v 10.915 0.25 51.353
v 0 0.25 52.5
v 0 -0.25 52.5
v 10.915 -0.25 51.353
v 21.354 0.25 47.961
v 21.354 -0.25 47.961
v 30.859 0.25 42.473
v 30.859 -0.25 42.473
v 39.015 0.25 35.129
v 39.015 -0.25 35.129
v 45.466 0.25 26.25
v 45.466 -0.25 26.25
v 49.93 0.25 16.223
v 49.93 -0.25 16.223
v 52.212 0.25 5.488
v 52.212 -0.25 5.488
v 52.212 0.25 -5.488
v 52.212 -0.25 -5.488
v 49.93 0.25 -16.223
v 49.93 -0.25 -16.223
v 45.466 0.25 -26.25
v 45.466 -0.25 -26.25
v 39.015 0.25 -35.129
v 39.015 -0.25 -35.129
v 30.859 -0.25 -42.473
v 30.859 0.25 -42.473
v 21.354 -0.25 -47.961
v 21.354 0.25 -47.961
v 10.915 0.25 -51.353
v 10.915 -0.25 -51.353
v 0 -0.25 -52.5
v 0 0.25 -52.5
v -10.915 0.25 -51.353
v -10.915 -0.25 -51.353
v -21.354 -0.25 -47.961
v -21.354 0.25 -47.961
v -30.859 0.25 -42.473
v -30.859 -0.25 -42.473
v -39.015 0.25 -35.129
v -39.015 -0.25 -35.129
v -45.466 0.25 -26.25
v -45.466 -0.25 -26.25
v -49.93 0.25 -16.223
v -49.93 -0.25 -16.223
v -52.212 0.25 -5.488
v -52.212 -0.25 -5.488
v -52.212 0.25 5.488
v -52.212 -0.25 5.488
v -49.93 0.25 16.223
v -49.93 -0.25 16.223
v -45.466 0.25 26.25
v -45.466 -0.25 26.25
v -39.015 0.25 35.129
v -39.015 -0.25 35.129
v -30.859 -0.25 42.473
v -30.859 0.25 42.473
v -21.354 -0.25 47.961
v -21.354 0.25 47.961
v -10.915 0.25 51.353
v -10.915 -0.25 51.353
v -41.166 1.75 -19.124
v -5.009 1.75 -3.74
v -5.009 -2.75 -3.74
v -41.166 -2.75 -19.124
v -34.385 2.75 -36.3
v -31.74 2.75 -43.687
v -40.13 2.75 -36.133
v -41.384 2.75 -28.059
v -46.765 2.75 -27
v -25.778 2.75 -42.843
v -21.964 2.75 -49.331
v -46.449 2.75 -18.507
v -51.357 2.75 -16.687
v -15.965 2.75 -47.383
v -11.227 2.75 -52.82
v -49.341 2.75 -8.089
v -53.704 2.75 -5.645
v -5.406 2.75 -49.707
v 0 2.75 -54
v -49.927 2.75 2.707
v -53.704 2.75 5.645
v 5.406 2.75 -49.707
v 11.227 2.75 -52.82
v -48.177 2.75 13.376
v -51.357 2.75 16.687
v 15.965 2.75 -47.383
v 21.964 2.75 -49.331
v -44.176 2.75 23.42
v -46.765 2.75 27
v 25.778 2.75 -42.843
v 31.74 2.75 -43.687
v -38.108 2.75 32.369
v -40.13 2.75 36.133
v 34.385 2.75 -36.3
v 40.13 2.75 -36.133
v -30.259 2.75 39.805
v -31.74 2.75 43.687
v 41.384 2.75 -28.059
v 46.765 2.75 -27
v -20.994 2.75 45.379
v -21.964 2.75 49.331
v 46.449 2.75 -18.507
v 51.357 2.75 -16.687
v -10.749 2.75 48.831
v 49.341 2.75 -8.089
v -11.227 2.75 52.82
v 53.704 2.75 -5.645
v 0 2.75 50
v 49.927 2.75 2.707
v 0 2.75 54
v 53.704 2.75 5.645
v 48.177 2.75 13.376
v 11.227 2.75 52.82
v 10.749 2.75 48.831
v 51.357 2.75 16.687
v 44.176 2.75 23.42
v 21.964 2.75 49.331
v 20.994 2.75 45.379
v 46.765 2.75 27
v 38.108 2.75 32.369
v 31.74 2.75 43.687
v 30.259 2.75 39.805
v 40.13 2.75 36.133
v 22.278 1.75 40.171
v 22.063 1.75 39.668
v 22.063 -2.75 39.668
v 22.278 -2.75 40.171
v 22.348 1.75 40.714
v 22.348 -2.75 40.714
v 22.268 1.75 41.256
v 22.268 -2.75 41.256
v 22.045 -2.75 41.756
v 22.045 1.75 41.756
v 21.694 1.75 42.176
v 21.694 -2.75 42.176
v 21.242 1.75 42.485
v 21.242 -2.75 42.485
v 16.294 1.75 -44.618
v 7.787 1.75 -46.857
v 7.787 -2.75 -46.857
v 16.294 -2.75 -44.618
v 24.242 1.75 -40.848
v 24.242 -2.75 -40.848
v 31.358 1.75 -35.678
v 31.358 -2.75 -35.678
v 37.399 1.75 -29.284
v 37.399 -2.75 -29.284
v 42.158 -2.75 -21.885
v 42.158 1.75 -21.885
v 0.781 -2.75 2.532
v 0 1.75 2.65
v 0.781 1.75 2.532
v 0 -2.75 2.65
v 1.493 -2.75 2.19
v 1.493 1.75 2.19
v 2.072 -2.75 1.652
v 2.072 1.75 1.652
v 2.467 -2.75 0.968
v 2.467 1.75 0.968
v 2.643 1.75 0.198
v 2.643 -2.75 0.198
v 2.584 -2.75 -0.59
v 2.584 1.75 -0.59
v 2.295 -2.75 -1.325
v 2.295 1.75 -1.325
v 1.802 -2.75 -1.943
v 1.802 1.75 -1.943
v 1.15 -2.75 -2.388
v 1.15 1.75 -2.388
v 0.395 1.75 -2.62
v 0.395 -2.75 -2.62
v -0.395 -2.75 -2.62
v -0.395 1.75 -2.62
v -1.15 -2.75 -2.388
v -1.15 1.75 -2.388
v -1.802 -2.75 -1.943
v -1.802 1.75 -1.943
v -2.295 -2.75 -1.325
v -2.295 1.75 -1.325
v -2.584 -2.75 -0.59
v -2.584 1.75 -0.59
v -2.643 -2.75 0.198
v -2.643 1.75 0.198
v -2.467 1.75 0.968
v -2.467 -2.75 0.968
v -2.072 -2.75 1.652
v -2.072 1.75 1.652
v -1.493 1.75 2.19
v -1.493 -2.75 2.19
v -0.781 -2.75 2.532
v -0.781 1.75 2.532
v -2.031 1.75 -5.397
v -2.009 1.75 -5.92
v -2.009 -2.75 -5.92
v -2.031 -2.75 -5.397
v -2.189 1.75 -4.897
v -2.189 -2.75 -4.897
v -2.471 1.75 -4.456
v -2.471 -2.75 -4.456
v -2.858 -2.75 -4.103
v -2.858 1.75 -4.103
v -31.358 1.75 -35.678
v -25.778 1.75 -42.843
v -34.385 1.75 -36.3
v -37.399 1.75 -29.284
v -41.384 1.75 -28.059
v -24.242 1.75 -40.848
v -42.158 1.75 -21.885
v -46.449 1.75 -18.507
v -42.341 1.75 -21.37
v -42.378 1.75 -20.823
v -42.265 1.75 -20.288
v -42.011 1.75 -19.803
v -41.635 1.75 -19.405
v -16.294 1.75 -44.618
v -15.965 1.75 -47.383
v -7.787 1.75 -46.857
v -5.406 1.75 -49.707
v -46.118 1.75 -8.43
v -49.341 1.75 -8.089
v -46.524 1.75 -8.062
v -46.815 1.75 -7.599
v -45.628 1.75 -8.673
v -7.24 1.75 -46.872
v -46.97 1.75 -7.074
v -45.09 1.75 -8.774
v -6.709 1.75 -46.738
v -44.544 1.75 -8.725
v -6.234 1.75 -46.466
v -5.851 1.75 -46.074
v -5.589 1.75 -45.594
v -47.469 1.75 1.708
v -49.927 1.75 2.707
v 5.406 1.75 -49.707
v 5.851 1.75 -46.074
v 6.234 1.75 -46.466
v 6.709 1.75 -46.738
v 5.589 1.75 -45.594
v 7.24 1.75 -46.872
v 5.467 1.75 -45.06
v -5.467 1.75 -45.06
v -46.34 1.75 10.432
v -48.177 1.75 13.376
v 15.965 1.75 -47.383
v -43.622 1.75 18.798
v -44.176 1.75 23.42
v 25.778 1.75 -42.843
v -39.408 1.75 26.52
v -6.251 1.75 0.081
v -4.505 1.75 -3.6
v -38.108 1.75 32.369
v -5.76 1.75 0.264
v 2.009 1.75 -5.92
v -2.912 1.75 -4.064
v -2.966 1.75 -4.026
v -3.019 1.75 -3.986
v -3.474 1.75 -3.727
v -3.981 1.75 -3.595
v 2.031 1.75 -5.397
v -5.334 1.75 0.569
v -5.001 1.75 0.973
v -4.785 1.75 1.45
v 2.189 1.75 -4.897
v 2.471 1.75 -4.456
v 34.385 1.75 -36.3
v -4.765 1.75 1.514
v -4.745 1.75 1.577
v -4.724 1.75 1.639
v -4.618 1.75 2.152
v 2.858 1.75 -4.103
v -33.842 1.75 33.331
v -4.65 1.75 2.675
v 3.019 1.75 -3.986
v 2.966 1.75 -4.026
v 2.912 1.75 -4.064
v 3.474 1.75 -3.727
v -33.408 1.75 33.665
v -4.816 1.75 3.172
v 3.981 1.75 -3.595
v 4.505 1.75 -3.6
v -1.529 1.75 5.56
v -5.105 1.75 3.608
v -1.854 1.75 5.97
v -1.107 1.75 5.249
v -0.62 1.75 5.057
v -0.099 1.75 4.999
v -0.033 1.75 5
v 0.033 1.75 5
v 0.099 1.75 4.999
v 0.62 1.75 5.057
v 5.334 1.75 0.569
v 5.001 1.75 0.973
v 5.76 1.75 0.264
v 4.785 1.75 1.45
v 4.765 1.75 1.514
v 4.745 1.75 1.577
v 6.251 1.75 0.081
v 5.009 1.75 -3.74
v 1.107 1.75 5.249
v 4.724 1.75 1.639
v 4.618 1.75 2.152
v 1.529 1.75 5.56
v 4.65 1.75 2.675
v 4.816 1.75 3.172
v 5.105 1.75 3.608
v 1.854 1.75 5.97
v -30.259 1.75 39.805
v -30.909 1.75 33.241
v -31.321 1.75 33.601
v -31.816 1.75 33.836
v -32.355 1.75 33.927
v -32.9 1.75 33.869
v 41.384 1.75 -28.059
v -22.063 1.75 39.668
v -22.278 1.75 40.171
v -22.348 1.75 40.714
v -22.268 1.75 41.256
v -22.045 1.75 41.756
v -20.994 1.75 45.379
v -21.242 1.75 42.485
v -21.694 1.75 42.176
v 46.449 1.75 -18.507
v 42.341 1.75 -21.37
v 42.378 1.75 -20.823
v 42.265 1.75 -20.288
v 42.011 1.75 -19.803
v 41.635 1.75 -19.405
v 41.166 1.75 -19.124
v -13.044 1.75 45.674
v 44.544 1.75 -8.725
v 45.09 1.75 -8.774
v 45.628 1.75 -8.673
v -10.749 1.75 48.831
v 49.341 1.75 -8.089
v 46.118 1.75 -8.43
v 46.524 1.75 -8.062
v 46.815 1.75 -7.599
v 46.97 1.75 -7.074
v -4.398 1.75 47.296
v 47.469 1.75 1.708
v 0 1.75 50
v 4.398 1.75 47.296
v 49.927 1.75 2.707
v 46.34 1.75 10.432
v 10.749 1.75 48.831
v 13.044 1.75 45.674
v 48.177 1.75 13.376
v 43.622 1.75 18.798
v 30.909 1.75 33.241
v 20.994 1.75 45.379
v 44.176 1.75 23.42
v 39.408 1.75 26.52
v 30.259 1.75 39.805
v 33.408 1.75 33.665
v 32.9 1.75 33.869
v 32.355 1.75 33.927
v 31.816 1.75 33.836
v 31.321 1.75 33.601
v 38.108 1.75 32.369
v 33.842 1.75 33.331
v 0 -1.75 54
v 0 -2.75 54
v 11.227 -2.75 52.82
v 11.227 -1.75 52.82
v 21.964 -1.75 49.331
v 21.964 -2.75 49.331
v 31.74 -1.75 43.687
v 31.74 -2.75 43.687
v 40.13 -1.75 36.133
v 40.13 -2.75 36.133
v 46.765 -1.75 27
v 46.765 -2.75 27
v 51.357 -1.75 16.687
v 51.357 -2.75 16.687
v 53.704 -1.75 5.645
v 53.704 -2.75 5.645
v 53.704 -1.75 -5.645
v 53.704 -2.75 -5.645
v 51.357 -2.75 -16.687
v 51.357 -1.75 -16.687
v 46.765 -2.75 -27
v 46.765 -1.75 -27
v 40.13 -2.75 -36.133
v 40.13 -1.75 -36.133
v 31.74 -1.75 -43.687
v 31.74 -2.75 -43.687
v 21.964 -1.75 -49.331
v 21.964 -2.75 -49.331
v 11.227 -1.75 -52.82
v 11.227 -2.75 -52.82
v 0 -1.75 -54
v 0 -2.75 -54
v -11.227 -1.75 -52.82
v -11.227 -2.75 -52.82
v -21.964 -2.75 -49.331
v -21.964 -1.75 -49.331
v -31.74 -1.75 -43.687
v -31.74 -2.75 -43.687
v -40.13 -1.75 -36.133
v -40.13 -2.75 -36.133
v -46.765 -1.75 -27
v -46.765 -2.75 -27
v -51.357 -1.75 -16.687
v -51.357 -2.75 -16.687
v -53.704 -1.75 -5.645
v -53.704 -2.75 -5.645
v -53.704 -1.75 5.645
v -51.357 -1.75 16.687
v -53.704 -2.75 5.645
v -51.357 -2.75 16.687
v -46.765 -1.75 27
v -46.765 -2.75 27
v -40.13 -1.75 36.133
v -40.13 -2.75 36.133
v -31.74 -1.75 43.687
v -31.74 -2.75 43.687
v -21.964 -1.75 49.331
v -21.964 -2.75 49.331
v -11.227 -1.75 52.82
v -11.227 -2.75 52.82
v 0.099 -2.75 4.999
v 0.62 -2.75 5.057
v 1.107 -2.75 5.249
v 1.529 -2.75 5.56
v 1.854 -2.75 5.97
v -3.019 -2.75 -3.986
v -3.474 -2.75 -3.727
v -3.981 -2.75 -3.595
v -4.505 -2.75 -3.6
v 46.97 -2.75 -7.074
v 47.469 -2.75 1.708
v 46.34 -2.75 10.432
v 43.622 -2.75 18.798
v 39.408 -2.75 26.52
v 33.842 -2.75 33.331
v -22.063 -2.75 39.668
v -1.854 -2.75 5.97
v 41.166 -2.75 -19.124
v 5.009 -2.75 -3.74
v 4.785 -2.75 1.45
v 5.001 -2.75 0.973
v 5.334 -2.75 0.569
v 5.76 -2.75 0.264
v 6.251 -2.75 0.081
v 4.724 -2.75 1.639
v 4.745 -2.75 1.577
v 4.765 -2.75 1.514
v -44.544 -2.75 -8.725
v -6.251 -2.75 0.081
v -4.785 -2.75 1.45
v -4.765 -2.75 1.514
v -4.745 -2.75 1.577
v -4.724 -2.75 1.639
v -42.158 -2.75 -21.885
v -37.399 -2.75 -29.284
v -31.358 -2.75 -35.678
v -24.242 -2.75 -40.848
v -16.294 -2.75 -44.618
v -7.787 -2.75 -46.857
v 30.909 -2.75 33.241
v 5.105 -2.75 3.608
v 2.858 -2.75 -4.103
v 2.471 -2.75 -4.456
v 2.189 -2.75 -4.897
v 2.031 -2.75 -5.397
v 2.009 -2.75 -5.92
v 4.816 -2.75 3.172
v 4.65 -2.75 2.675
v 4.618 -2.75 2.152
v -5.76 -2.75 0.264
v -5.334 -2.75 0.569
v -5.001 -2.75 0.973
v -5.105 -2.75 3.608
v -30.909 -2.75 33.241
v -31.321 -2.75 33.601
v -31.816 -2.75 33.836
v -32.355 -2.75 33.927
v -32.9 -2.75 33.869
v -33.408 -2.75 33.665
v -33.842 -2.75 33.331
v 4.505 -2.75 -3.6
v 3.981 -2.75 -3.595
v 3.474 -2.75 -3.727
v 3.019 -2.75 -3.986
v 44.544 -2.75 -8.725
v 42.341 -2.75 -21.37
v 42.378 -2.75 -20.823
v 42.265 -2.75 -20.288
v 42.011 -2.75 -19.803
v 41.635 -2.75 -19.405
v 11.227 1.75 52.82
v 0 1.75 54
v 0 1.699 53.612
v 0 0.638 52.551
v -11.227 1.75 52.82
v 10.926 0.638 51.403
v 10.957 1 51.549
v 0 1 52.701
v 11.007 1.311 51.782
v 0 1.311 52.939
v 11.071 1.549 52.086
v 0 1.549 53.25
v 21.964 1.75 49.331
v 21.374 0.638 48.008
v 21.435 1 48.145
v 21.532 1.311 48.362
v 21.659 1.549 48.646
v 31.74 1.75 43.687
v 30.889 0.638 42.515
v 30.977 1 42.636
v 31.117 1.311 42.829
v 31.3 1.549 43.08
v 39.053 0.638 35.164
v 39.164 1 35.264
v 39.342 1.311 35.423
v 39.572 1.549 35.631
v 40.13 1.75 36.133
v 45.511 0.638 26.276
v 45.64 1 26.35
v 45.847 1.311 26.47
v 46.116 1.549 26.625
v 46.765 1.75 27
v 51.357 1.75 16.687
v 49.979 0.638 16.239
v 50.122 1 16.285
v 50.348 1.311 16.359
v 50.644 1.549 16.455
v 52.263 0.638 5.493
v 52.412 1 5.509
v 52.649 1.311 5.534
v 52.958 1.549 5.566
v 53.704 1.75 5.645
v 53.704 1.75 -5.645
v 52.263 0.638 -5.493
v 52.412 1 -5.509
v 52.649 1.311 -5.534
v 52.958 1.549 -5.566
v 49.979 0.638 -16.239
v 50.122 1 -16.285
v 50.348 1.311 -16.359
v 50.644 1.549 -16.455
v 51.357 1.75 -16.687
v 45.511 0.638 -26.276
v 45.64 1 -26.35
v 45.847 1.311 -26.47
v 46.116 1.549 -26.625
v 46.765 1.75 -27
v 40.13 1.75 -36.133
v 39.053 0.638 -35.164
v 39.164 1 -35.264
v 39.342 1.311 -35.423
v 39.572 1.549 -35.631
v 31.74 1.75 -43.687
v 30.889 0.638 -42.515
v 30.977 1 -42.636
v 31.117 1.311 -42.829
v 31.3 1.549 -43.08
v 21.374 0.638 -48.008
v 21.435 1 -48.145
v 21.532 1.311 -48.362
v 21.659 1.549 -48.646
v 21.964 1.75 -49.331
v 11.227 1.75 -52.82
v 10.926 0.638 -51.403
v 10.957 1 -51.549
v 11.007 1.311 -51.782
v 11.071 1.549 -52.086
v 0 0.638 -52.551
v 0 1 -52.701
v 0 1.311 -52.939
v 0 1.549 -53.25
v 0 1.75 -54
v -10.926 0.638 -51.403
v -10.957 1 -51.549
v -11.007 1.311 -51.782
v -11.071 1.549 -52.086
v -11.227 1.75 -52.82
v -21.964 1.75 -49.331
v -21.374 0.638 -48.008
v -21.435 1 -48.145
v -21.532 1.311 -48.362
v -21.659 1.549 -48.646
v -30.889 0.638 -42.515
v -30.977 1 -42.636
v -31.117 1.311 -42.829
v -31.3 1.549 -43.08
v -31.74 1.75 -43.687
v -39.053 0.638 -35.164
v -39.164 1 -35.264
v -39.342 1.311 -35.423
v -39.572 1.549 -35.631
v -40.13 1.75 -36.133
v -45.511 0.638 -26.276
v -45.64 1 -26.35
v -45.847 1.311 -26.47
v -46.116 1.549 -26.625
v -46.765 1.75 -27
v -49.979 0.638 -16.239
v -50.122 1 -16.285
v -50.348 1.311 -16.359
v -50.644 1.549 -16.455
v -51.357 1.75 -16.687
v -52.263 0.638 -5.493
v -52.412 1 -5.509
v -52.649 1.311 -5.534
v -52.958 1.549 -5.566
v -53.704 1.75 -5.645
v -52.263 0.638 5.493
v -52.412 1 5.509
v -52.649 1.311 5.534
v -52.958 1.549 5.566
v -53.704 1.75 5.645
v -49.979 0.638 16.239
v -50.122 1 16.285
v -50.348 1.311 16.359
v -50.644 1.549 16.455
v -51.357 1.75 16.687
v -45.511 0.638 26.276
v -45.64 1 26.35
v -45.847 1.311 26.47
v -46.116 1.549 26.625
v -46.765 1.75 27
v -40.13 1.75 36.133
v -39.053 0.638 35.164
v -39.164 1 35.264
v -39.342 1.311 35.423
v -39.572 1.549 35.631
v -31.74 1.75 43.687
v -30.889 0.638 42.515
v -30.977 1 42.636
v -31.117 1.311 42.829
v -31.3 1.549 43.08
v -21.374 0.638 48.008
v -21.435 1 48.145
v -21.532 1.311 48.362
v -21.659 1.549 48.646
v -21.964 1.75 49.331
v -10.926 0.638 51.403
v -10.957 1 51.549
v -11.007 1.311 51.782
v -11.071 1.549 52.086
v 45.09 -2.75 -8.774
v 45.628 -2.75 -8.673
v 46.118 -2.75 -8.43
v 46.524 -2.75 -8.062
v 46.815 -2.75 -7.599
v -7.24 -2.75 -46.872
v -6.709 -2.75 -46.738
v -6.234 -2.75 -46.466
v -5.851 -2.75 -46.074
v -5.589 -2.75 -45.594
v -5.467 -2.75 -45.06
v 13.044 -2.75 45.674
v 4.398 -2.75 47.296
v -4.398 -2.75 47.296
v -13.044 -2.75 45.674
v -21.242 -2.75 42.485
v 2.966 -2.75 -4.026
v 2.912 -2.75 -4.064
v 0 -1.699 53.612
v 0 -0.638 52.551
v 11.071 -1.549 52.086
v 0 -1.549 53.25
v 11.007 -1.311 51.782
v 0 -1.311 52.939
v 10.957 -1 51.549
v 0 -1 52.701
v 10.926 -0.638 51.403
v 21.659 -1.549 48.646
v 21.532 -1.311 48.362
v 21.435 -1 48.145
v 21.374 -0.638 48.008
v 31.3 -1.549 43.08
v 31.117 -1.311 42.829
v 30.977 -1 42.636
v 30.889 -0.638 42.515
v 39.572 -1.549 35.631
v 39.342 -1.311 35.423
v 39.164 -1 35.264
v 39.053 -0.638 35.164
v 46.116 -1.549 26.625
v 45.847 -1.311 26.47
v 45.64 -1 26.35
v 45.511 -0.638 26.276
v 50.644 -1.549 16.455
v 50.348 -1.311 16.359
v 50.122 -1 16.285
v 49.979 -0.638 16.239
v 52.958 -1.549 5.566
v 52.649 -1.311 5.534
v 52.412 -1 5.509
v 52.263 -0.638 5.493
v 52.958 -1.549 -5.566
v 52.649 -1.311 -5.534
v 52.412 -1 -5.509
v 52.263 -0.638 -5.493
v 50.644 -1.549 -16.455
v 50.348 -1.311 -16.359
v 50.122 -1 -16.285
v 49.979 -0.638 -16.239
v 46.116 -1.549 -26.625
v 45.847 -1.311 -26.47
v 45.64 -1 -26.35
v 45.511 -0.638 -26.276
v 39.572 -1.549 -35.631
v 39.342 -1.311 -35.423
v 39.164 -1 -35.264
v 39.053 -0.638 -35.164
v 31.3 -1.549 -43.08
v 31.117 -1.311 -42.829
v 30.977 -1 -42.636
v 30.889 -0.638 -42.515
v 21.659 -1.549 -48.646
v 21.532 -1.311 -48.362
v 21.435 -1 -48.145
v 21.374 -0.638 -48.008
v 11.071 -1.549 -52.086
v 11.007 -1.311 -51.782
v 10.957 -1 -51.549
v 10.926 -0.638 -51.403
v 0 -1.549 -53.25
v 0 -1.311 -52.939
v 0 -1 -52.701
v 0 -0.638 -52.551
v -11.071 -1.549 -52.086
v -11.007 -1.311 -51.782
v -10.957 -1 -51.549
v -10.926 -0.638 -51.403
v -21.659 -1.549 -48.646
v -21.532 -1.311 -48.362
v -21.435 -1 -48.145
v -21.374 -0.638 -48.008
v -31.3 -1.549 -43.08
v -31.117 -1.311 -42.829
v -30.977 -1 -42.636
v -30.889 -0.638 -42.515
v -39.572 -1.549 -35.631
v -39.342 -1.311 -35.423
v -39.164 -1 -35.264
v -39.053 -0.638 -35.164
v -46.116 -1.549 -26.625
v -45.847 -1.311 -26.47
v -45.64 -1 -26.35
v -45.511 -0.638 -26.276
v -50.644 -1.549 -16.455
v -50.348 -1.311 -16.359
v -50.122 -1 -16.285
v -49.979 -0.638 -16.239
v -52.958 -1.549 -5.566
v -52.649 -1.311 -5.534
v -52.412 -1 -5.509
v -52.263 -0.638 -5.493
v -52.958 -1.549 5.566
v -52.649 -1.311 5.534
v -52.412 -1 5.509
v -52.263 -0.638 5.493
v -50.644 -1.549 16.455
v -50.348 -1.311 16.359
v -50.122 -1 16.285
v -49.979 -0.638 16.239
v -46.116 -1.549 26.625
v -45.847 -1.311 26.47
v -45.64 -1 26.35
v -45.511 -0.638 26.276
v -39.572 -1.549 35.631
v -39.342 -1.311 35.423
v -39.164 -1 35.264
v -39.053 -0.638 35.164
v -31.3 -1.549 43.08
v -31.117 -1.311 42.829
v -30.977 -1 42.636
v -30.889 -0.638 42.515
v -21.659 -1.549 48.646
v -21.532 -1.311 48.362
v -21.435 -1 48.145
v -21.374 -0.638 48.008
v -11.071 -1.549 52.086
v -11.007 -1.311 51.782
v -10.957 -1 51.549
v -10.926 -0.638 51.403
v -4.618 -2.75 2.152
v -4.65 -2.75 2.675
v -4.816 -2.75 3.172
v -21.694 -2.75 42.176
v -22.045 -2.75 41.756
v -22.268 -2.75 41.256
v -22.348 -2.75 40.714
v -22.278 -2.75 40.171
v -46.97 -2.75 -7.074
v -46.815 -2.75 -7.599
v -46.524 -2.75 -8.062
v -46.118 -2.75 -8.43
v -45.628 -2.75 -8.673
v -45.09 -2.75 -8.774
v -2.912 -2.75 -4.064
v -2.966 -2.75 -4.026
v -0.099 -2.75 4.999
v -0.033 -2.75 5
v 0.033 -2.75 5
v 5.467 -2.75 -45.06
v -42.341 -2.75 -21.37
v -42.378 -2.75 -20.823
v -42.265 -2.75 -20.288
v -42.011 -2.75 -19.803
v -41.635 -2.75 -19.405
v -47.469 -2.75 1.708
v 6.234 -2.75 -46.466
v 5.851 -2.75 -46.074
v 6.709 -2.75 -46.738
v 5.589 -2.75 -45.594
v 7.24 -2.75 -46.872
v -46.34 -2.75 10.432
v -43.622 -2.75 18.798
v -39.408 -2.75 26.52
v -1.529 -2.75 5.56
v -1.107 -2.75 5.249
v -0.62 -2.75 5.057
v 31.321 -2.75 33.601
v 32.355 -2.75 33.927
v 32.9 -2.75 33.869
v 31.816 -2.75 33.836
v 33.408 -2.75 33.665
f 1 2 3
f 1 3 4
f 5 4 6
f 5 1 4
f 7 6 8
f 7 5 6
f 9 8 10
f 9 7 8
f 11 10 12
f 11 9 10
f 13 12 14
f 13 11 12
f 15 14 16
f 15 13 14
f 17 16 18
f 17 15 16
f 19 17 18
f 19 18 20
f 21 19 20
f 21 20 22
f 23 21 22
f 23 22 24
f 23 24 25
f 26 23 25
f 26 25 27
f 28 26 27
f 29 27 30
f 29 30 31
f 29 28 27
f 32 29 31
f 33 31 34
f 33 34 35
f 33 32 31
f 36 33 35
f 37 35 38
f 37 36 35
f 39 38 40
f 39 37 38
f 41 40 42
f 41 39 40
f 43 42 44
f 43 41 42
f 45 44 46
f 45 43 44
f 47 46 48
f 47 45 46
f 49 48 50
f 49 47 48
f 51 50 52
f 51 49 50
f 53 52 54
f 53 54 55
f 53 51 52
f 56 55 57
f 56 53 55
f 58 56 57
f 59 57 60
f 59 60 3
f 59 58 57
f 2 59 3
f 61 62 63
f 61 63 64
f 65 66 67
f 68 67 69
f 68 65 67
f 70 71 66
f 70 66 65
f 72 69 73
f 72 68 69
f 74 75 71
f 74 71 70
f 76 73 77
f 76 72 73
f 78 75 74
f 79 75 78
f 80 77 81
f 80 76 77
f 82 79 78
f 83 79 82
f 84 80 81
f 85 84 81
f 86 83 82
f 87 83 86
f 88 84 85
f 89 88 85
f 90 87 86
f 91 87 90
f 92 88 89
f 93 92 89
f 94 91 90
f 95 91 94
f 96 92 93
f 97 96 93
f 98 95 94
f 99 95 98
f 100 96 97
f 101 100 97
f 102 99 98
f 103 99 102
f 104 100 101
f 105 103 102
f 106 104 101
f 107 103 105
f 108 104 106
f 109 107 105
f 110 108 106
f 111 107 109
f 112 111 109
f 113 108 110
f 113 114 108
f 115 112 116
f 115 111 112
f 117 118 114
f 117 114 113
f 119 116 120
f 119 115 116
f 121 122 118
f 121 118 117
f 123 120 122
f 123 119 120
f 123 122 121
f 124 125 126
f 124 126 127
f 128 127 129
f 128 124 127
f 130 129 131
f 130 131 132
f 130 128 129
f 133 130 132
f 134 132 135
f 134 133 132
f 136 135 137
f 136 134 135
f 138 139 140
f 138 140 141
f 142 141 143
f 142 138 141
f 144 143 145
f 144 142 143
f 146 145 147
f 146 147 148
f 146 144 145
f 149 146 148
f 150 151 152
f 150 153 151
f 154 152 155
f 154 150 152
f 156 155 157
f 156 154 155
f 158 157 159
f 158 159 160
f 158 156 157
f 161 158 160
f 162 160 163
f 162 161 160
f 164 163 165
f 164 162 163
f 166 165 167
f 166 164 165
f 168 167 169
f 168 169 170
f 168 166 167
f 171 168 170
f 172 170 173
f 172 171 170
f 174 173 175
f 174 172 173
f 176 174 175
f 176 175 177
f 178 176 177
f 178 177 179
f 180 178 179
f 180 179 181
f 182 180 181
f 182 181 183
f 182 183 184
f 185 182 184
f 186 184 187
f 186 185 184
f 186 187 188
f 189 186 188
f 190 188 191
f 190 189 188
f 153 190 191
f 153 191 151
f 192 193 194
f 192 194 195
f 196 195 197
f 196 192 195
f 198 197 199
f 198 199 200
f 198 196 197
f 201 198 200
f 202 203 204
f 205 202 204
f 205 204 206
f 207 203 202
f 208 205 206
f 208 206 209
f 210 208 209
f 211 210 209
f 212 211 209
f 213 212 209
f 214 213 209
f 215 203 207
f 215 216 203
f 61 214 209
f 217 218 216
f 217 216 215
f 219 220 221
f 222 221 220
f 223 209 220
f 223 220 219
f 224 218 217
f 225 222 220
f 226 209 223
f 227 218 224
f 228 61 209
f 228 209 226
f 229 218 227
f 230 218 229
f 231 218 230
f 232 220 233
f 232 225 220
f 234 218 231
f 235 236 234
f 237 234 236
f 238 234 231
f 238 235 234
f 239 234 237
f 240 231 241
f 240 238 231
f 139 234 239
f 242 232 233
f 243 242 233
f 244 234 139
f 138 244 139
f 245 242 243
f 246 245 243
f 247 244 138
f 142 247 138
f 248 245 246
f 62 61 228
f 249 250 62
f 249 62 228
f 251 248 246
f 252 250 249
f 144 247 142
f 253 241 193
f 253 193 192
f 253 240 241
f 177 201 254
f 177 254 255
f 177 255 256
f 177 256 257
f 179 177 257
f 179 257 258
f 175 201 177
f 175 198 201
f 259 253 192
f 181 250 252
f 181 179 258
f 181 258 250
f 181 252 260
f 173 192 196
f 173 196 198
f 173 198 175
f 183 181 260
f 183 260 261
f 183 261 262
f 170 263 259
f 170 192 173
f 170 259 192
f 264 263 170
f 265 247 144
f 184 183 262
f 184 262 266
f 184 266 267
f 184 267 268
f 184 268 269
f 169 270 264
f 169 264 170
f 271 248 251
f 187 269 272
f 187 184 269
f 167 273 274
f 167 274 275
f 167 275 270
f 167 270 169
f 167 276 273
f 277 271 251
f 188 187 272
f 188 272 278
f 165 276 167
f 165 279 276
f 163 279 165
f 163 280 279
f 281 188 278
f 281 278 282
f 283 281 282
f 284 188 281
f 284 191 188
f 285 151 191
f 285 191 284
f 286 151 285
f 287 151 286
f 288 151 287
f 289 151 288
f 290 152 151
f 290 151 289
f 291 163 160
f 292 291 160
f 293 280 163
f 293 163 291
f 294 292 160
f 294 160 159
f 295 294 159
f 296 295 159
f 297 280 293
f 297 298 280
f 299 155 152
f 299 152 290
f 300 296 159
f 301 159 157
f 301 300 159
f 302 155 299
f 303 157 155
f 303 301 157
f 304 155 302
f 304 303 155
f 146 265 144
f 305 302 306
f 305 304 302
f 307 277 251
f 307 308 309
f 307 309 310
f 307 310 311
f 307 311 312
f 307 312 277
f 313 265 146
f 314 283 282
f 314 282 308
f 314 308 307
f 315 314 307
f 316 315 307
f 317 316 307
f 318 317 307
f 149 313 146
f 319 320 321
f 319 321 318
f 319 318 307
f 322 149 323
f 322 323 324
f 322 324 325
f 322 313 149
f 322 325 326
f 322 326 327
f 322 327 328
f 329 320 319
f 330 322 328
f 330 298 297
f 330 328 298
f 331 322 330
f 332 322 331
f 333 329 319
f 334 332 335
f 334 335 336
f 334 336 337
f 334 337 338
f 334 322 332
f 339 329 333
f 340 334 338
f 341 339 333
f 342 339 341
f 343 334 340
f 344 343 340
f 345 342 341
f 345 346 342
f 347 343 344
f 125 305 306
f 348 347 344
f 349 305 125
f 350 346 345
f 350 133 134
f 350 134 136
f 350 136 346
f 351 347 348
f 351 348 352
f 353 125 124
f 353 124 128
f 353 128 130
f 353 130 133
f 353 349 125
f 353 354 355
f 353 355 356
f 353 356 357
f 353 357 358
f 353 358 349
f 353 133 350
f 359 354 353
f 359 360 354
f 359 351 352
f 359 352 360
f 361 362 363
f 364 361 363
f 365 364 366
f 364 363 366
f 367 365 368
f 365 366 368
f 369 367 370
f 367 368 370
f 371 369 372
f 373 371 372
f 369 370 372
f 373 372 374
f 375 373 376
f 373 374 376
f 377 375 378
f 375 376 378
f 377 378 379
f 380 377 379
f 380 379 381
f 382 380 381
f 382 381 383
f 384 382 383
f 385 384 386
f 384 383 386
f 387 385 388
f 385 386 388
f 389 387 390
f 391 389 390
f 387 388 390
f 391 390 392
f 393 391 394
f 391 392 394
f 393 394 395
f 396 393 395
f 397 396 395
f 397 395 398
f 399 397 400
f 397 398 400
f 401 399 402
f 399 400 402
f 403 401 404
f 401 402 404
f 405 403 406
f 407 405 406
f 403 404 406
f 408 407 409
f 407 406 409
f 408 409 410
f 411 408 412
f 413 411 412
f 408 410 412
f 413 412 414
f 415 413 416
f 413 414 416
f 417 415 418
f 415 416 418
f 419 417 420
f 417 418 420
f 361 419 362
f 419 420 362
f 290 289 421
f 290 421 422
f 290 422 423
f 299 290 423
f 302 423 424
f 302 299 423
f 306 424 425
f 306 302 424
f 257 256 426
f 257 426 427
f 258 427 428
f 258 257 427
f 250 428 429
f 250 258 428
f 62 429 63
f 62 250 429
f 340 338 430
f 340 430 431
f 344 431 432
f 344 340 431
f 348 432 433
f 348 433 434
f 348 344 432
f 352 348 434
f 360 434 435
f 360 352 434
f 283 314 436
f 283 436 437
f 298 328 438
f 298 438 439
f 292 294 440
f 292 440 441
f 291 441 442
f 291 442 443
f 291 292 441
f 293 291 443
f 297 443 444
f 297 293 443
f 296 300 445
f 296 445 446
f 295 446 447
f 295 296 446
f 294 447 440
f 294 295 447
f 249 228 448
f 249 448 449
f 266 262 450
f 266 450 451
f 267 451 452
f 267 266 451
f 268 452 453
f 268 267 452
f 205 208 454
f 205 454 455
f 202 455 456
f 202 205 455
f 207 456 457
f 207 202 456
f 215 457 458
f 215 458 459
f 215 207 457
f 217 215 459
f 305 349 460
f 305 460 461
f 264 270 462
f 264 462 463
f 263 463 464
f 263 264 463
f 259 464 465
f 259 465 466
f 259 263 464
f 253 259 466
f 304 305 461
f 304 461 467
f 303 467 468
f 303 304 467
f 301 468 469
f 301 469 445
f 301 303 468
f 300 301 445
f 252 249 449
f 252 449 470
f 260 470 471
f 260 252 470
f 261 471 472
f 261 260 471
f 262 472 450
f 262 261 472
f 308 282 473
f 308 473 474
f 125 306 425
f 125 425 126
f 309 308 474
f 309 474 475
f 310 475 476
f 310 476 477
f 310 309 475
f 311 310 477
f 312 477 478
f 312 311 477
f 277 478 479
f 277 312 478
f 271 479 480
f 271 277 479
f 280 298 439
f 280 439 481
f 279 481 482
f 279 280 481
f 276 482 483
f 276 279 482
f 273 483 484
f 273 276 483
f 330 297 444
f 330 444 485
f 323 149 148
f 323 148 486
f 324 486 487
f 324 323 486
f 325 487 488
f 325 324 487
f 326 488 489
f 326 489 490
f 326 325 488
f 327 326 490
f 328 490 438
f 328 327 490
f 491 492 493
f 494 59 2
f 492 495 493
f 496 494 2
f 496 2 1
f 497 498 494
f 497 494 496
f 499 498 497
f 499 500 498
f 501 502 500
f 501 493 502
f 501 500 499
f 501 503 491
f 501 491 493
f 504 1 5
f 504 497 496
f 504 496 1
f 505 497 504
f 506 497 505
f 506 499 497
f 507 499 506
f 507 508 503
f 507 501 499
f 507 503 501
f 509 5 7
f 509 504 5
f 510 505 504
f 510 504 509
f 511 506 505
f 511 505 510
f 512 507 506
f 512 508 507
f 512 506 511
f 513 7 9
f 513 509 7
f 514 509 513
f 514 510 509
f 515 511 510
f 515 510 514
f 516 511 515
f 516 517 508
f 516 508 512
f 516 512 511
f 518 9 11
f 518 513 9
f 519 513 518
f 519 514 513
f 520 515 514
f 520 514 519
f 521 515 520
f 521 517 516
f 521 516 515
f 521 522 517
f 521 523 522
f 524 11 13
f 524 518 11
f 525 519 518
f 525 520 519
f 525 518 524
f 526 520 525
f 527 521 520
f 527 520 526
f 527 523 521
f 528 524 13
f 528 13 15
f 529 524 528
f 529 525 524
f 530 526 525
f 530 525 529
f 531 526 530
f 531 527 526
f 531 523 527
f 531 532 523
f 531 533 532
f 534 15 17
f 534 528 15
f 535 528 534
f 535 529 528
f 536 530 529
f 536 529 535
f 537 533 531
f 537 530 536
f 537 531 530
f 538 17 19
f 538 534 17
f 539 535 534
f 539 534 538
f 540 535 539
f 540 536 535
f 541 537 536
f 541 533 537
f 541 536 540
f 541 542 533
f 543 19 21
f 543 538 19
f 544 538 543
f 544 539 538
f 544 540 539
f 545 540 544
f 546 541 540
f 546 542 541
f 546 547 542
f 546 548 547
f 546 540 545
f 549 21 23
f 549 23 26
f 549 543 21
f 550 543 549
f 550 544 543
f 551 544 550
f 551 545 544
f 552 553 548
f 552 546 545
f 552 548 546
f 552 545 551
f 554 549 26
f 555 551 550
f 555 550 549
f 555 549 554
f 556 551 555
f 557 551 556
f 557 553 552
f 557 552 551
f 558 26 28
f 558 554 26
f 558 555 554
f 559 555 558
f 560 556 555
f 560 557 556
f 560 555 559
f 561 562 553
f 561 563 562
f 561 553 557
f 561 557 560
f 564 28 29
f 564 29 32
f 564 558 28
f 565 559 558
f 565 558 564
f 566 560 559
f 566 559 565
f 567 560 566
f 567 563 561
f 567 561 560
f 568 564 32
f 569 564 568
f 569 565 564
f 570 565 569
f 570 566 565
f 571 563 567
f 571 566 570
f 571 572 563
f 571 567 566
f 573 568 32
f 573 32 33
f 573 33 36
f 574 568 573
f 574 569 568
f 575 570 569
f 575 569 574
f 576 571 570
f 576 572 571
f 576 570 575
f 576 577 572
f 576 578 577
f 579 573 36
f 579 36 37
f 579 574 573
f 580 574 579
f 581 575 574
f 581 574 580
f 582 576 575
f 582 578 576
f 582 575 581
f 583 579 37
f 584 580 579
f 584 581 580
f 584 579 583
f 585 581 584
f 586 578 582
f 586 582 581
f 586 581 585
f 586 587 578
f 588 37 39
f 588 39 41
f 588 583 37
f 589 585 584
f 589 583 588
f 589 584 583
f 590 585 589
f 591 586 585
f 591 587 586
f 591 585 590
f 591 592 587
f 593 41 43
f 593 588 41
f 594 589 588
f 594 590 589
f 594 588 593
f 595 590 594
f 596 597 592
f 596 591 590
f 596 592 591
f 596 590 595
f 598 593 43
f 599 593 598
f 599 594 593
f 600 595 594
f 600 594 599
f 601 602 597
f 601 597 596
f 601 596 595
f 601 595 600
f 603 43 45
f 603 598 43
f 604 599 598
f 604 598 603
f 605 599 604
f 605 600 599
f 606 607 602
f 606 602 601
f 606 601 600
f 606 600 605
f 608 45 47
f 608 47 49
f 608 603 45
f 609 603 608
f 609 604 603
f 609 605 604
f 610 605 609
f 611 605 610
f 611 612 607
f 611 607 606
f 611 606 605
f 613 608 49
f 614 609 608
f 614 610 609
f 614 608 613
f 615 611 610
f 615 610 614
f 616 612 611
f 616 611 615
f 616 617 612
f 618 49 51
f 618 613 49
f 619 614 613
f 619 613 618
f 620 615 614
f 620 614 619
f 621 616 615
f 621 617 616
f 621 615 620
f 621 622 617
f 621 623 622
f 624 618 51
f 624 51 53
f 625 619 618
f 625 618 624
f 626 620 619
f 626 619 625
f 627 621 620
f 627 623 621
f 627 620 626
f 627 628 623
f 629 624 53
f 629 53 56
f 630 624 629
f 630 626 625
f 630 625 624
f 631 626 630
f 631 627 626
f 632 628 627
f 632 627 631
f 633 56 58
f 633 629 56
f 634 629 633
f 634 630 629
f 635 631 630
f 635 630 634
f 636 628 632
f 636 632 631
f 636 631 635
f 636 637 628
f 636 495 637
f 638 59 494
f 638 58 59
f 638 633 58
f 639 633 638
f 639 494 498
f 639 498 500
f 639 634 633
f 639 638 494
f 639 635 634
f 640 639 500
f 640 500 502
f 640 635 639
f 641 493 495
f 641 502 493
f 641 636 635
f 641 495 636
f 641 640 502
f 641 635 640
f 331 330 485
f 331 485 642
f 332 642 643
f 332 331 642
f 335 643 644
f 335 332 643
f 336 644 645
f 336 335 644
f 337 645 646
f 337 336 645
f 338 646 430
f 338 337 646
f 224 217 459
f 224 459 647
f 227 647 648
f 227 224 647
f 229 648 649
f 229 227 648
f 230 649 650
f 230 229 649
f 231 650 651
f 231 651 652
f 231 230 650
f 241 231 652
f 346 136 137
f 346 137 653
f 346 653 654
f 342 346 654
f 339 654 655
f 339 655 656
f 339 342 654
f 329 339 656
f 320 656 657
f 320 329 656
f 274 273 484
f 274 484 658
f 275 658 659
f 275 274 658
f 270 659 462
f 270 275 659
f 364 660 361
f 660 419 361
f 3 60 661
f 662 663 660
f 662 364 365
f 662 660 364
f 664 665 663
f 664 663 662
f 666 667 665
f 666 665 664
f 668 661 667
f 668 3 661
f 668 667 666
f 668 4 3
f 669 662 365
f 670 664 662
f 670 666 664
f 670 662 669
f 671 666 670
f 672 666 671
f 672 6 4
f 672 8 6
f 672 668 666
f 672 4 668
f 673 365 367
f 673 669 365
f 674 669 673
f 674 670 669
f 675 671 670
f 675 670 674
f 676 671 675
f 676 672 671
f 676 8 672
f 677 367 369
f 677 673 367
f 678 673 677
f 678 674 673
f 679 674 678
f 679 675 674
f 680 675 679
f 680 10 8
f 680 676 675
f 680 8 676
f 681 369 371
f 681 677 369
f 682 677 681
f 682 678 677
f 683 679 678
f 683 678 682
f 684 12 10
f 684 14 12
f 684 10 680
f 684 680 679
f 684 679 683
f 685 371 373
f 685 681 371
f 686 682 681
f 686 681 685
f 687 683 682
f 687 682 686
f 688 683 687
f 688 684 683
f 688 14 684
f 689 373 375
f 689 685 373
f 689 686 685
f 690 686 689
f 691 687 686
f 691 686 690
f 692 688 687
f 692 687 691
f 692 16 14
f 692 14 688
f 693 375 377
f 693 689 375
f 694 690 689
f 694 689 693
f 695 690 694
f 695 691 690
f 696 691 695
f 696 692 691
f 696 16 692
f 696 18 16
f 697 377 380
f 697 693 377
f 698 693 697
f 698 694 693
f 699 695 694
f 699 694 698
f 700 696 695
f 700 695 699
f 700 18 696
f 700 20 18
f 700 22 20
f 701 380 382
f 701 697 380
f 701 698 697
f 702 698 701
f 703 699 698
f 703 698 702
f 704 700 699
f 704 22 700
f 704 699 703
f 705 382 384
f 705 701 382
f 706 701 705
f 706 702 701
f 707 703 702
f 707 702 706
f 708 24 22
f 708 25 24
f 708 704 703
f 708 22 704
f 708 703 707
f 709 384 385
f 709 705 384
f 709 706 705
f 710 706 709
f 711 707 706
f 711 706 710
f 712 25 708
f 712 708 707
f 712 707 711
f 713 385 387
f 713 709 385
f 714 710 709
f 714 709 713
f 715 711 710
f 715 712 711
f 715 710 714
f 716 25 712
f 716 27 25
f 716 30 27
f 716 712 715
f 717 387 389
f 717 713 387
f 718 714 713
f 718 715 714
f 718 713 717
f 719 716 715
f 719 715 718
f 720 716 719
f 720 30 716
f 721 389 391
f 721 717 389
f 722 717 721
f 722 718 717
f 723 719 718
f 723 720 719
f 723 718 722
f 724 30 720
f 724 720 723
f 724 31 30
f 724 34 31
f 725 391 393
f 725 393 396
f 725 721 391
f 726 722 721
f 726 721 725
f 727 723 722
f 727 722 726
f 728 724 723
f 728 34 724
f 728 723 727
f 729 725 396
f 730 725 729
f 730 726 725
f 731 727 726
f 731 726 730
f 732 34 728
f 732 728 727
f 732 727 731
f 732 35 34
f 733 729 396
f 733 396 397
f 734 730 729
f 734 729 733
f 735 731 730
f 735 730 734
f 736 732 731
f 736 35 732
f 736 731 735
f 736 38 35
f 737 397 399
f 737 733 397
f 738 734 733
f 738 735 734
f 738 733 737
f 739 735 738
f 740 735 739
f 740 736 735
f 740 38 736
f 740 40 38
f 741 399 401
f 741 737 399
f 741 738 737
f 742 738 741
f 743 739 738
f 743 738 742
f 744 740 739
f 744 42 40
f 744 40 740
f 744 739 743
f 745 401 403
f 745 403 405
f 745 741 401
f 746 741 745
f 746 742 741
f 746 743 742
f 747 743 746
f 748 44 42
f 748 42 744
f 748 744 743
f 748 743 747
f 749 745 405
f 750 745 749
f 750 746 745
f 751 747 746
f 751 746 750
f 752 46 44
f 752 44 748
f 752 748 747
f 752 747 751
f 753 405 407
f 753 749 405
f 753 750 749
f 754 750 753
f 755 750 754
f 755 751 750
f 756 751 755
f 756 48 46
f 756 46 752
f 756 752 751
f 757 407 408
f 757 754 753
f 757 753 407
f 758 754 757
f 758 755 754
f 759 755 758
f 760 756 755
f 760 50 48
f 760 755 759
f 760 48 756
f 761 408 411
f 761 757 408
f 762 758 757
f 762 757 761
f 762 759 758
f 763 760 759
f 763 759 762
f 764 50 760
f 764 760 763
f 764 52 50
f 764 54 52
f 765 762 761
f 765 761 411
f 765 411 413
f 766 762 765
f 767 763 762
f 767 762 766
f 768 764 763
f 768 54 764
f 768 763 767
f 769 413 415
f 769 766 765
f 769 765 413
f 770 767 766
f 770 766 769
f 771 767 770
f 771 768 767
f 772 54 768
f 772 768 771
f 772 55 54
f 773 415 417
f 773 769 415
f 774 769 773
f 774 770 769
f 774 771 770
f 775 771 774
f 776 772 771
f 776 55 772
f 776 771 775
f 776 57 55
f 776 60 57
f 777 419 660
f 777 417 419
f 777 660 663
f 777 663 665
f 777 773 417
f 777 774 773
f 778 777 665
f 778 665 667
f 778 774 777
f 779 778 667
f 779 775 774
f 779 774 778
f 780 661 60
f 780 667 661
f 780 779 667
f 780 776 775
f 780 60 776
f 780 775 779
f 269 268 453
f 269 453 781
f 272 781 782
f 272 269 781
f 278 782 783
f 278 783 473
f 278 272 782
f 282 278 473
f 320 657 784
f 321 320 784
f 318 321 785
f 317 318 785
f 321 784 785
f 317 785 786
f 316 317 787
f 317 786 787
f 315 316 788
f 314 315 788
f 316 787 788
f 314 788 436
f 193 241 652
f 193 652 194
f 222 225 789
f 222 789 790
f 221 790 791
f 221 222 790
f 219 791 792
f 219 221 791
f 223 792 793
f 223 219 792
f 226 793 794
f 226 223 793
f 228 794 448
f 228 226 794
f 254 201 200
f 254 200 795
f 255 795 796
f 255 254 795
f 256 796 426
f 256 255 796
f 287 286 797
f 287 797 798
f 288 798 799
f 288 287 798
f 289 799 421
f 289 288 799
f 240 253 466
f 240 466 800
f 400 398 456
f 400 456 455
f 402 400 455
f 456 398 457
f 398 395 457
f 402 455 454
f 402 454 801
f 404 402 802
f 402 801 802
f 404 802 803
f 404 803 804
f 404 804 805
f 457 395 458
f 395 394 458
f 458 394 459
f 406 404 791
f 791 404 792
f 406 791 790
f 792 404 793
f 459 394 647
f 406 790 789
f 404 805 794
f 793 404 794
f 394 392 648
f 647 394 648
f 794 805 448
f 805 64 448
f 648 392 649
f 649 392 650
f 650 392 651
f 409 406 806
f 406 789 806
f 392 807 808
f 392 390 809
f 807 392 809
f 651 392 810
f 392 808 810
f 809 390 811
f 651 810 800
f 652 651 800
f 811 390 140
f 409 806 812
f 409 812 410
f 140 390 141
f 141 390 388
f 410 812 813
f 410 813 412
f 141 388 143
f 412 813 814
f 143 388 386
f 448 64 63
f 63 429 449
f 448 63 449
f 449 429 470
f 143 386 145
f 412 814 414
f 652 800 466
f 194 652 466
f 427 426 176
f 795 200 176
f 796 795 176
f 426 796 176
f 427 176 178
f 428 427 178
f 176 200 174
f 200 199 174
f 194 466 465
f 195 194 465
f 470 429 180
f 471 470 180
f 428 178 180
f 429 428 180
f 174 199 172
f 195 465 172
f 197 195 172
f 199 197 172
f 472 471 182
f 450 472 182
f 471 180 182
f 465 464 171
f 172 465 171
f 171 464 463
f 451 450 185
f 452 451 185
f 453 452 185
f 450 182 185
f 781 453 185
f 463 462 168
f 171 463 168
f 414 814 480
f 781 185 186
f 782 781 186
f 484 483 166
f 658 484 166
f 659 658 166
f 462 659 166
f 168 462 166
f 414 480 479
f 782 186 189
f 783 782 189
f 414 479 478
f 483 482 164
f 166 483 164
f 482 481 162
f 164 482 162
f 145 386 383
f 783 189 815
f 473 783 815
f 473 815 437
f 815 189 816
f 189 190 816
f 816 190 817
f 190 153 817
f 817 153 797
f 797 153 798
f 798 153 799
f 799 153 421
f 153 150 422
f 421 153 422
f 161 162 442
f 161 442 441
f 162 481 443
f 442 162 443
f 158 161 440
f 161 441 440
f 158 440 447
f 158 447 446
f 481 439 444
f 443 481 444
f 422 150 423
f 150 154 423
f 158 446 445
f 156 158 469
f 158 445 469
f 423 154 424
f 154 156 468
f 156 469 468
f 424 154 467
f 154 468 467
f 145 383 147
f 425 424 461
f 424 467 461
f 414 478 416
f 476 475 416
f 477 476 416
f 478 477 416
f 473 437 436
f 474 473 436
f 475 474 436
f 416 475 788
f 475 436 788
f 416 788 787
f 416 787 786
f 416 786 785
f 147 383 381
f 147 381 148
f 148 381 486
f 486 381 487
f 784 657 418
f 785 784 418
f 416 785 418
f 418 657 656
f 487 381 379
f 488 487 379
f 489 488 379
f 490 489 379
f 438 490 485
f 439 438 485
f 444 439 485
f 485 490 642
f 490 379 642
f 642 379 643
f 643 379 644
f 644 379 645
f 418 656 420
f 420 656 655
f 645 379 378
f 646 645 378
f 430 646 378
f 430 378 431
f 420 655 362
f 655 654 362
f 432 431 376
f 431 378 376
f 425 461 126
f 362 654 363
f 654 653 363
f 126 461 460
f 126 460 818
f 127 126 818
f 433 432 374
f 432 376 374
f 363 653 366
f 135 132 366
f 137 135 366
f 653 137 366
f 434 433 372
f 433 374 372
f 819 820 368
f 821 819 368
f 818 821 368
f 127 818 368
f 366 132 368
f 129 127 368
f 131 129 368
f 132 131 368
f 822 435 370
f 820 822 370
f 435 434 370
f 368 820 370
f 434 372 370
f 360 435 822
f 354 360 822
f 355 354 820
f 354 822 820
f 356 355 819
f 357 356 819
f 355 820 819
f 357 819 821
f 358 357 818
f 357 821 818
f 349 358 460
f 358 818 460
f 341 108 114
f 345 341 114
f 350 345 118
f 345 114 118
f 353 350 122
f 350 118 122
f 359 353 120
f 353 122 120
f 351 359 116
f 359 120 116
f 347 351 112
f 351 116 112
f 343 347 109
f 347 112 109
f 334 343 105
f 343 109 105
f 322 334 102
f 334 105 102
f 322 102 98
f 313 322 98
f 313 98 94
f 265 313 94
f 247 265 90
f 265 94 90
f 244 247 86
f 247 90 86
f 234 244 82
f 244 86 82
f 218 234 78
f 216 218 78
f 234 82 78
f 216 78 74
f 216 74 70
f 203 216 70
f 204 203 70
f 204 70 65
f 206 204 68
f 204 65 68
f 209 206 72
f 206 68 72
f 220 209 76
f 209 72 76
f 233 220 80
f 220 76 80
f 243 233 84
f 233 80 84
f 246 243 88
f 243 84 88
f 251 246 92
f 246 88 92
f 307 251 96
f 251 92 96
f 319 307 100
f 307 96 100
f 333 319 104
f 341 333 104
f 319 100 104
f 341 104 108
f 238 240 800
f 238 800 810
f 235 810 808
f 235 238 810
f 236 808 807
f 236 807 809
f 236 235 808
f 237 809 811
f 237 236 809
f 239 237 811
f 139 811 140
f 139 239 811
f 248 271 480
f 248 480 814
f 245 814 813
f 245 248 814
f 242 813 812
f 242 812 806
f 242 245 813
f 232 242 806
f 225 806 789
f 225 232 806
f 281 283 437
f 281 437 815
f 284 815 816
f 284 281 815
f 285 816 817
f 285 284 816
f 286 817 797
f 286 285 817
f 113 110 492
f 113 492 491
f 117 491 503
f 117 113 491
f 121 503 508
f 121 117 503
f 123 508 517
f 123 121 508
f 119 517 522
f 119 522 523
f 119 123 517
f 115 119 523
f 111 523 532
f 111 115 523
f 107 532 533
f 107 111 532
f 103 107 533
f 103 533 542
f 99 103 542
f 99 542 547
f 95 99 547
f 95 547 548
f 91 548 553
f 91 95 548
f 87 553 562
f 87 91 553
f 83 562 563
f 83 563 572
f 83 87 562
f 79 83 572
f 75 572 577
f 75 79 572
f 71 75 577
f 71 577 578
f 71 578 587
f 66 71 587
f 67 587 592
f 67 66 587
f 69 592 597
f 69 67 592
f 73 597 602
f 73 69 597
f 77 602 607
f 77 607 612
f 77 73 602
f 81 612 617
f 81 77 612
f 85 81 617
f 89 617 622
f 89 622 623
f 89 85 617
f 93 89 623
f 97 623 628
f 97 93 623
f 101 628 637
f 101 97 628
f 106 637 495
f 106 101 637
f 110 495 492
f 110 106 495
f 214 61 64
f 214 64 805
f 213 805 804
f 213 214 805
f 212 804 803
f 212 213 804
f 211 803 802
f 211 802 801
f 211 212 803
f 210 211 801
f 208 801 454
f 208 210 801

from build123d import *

# Parameters (mm, degrees)
SKETCH_2_R          = 52.5
SKETCH_2_R_2        = 2.65
EXTRUDE_1_DEPTH     = 2.75
SKETCH_3_R          = 54
SKETCH_3_R_2        = 52.5
EXTRUDE_2_DEPTH     = 1
SKETCH_4_R          = 50
SKETCH_4_R_2        = 2.65
CUT_EXTRUDE_1_DEPTH = 1
FILLET_1_R          = 1.5


with BuildPart() as part:
    # 草图2 → 凸台-拉伸1 (new, symmetric)
    with BuildSketch(Plane(origin=(0, 0, 0), x_dir=(1, 0, 0), z_dir=(0, 1, 0))):
        with Locations(Location((0, 0, 0), (0, 0, 270))):
            Circle(SKETCH_2_R)
        with Locations(Location((0, 0, 0), (0, 0, 270))):
            Circle(SKETCH_2_R_2, mode=Mode.SUBTRACT)
        with BuildLine():
            Line((-5.104760308, -3.608479293), (-30.908533356, -33.241423952))
            ThreePointArc((-30.908533356, -33.241423952), (-32.355479798, -33.927082172), (-33.841752753, -33.331453173))
            ThreePointArc((-33.841752753, -33.331453173), (-45.175184524, -14.678307233), (-46.970289709, 7.074028884))
            ThreePointArc((-46.970289709, 7.074028884), (-46.117971572, 8.42951219), (-44.544347521, 8.725296818))
            Line((-44.544347521, 8.725296818), (-6.250848753, -0.081181754))
            ThreePointArc((-6.250848753, -0.081181754), (-5.333939805, -0.568676849), (-4.785067523, -1.450216811))
            ThreePointArc((-4.785067523, -1.450216811), (-4.755282581, -1.545084972), (-4.723617, -1.639342075))
            ThreePointArc((-4.723617, -1.639342075), (-4.649507815, -2.675141919), (-5.104760308, -3.608479293))
        make_face(mode=Mode.SUBTRACT)
        with BuildLine():
            Line((-5.009325433, 3.73983413), (-41.165734939, 19.123597139))
            ThreePointArc((-41.165734939, 19.123597139), (-42.264965697, 20.287844939), (-42.157772458, 21.885434001))
            ThreePointArc((-42.157772458, 21.885434001), (-27.919799484, 38.428307233), (-7.786816484, 46.857395244))
            ThreePointArc((-7.786816484, 46.857395244), (-6.234294464, 46.465659903), (-5.466709992, 45.060456971))
            Line((-5.466709992, 45.060456971), (-2.00882693, 5.919823897))
            ThreePointArc((-2.00882693, 5.919823897), (-2.18912187, 4.897147398), (-2.857905332, 4.102728009))
            ThreePointArc((-2.857905332, 4.102728009), (-2.938926261, 4.045084972), (-3.018784891, 3.985842167))
            ThreePointArc((-3.018784891, 3.985842167), (-3.980988084, 3.595280389), (-5.009325433, 3.73983413))
        make_face(mode=Mode.SUBTRACT)
        with BuildLine():
            Line((1.854410058, -5.96999698), (22.063210783, -39.667926976))
            ThreePointArc((22.063210783, -39.667926976), (22.26817946, -41.255934861), (21.242419017, -42.485404956))
            ThreePointArc((21.242419017, -42.485404956), (0, -47.5), (-21.242419017, -42.485404956))
            ThreePointArc((-21.242419017, -42.485404956), (-22.26817946, -41.255934861), (-22.063210783, -39.667926976))
            Line((-22.063210783, -39.667926976), (-1.854410058, -5.96999698))
            ThreePointArc((-1.854410058, -5.96999698), (-1.107434224, -5.24860902), (-0.099429036, -4.999011289))
            ThreePointArc((-0.099429036, -4.999011289), (0, -5), (0.099429036, -4.999011289))
            ThreePointArc((0.099429036, -4.999011289), (1.107434224, -5.24860902), (1.854410058, -5.96999698))
        make_face(mode=Mode.SUBTRACT)
        with BuildLine():
            Line((6.250848753, -0.081181754), (44.544347521, 8.725296818))
            ThreePointArc((44.544347521, 8.725296818), (46.117971572, 8.42951219), (46.970289709, 7.074028884))
            ThreePointArc((46.970289709, 7.074028884), (45.175184524, -14.678307233), (33.841752753, -33.331453173))
            ThreePointArc((33.841752753, -33.331453173), (32.355479798, -33.927082172), (30.908533356, -33.241423952))
            Line((30.908533356, -33.241423952), (5.104760308, -3.608479293))
            ThreePointArc((5.104760308, -3.608479293), (4.649507815, -2.675141919), (4.723617, -1.639342075))
            ThreePointArc((4.723617, -1.639342075), (4.755282581, -1.545084972), (4.785067523, -1.450216811))
            ThreePointArc((4.785067523, -1.450216811), (5.333939805, -0.568676849), (6.250848753, -0.081181754))
        make_face(mode=Mode.SUBTRACT)
        with BuildLine():
            Line((2.00882693, 5.919823897), (5.466709992, 45.060456971))
            ThreePointArc((5.466709992, 45.060456971), (6.234294464, 46.465659903), (7.786816484, 46.857395244))
            ThreePointArc((7.786816484, 46.857395244), (27.919799484, 38.428307233), (42.157772458, 21.885434001))
            ThreePointArc((42.157772458, 21.885434001), (42.264965697, 20.287844939), (41.165734939, 19.123597139))
            Line((41.165734939, 19.123597139), (5.009325433, 3.73983413))
            ThreePointArc((5.009325433, 3.73983413), (3.980988084, 3.595280389), (3.018784891, 3.985842167))
            ThreePointArc((3.018784891, 3.985842167), (2.938926261, 4.045084972), (2.857905332, 4.102728009))
            ThreePointArc((2.857905332, 4.102728009), (2.18912187, 4.897147398), (2.00882693, 5.919823897))
        make_face(mode=Mode.SUBTRACT)
    extrude(amount=EXTRUDE_1_DEPTH, both=True)

    # 草图3 → 凸台-拉伸2 (add)
    with BuildSketch(Plane(origin=(0, 2.75, 0), x_dir=(1, 0, 0), z_dir=(0, 1, 0))):
        with Locations(Location((0, 0, 0), (0, 0, 270))):
            Circle(SKETCH_3_R)
        with Locations(Location((0, 0, 0), (0, 0, 270))):
            Circle(SKETCH_3_R_2, mode=Mode.SUBTRACT)
    extrude_2 = extrude(amount=-EXTRUDE_2_DEPTH)

    # 草图4 → 切除-拉伸1 (cut)
    with BuildSketch(Plane(origin=(0, 2.75, 0), x_dir=(1, 0, 0), z_dir=(0, 1, 0))):
        with Locations(Location((0, 0, 0), (0, 0, 270))):
            Circle(SKETCH_4_R)
        with Locations(Location((0, 0, 0), (0, 0, 270))):
            Circle(SKETCH_4_R_2, mode=Mode.SUBTRACT)
        with BuildLine():
            Line((41.165734939, 19.123597139), (5.009325433, 3.73983413))
            ThreePointArc((5.009325433, 3.73983413), (3.980988084, 3.595280389), (3.018784891, 3.985842167))
            ThreePointArc((3.018784891, 3.985842167), (2.938926261, 4.045084972), (2.857905332, 4.102728009))
            ThreePointArc((2.857905332, 4.102728009), (2.18912187, 4.897147398), (2.00882693, 5.919823897))
            Line((2.00882693, 5.919823897), (5.466709992, 45.060456971))
            ThreePointArc((5.466709992, 45.060456971), (6.234294464, 46.465659903), (7.786816484, 46.857395244))
            ThreePointArc((7.786816484, 46.857395244), (27.919799484, 38.428307233), (42.157772458, 21.885434001))
            ThreePointArc((42.157772458, 21.885434001), (42.264965697, 20.287844939), (41.165734939, 19.123597139))
        make_face(mode=Mode.SUBTRACT)
        with BuildLine():
            Line((30.908533356, -33.241423952), (5.104760308, -3.608479293))
            ThreePointArc((5.104760308, -3.608479293), (4.649507815, -2.675141919), (4.723617, -1.639342075))
            ThreePointArc((4.723617, -1.639342075), (4.755282581, -1.545084972), (4.785067523, -1.450216811))
            ThreePointArc((4.785067523, -1.450216811), (5.333939805, -0.568676849), (6.250848753, -0.081181754))
            Line((6.250848753, -0.081181754), (44.544347521, 8.725296818))
            ThreePointArc((44.544347521, 8.725296818), (46.117971572, 8.42951219), (46.970289709, 7.074028884))
            ThreePointArc((46.970289709, 7.074028884), (45.175184524, -14.678307233), (33.841752753, -33.331453173))
            ThreePointArc((33.841752753, -33.331453173), (32.355479798, -33.927082172), (30.908533356, -33.241423952))
        make_face(mode=Mode.SUBTRACT)
        with BuildLine():
            Line((-22.063210783, -39.667926976), (-1.854410058, -5.96999698))
            ThreePointArc((-1.854410058, -5.96999698), (-1.107434224, -5.24860902), (-0.099429036, -4.999011289))
            ThreePointArc((-0.099429036, -4.999011289), (0, -5), (0.099429036, -4.999011289))
            ThreePointArc((0.099429036, -4.999011289), (1.107434224, -5.24860902), (1.854410058, -5.96999698))
            Line((1.854410058, -5.96999698), (22.063210783, -39.667926976))
            ThreePointArc((22.063210783, -39.667926976), (22.26817946, -41.255934861), (21.242419017, -42.485404956))
            ThreePointArc((21.242419017, -42.485404956), (0, -47.5), (-21.242419017, -42.485404956))
            ThreePointArc((-21.242419017, -42.485404956), (-22.26817946, -41.255934861), (-22.063210783, -39.667926976))
        make_face(mode=Mode.SUBTRACT)
        with BuildLine():
            Line((-44.544347521, 8.725296818), (-6.250848753, -0.081181754))
            ThreePointArc((-6.250848753, -0.081181754), (-5.333939805, -0.568676849), (-4.785067523, -1.450216811))
            ThreePointArc((-4.785067523, -1.450216811), (-4.755282581, -1.545084972), (-4.723617, -1.639342075))
            ThreePointArc((-4.723617, -1.639342075), (-4.649507815, -2.675141919), (-5.104760308, -3.608479293))
            Line((-5.104760308, -3.608479293), (-30.908533356, -33.241423952))
            ThreePointArc((-30.908533356, -33.241423952), (-32.355479798, -33.927082172), (-33.841752753, -33.331453173))
            ThreePointArc((-33.841752753, -33.331453173), (-45.175184524, -14.678307233), (-46.970289709, 7.074028884))
            ThreePointArc((-46.970289709, 7.074028884), (-46.117971572, 8.42951219), (-44.544347521, 8.725296818))
        make_face(mode=Mode.SUBTRACT)
        with BuildLine():
            ThreePointArc((-7.786816484, 46.857395244), (-6.234294464, 46.465659903), (-5.466709992, 45.060456971))
            Line((-5.466709992, 45.060456971), (-2.00882693, 5.919823897))
            ThreePointArc((-2.00882693, 5.919823897), (-2.18912187, 4.897147398), (-2.857905332, 4.102728009))
            ThreePointArc((-2.857905332, 4.102728009), (-2.938926261, 4.045084972), (-3.018784891, 3.985842167))
            ThreePointArc((-3.018784891, 3.985842167), (-3.980988084, 3.595280389), (-5.009325433, 3.73983413))
            Line((-5.009325433, 3.73983413), (-41.165734939, 19.123597139))
            ThreePointArc((-41.165734939, 19.123597139), (-42.264965697, 20.287844939), (-42.157772458, 21.885434001))
            ThreePointArc((-42.157772458, 21.885434001), (-27.919799484, 38.428307233), (-7.786816484, 46.857395244))
        make_face(mode=Mode.SUBTRACT)
    extrude(amount=-CUT_EXTRUDE_1_DEPTH, mode=Mode.SUBTRACT)

    # 镜向1: 凸台-拉伸2 across plane
    add(extrude_2.mirror(Plane.ZX))

    # 圆角1
    fillet_1_edges = [part.edges().sort_by_distance(p)[0] for p in [
        (0, 1.75, -52.5),
        (0, -1.75, -52.5),
    ]]
    fillet(fillet_1_edges, radius=FILLET_1_R - 0.0001)  # a hair under: the kernel refuses the full size


solid = part.part
